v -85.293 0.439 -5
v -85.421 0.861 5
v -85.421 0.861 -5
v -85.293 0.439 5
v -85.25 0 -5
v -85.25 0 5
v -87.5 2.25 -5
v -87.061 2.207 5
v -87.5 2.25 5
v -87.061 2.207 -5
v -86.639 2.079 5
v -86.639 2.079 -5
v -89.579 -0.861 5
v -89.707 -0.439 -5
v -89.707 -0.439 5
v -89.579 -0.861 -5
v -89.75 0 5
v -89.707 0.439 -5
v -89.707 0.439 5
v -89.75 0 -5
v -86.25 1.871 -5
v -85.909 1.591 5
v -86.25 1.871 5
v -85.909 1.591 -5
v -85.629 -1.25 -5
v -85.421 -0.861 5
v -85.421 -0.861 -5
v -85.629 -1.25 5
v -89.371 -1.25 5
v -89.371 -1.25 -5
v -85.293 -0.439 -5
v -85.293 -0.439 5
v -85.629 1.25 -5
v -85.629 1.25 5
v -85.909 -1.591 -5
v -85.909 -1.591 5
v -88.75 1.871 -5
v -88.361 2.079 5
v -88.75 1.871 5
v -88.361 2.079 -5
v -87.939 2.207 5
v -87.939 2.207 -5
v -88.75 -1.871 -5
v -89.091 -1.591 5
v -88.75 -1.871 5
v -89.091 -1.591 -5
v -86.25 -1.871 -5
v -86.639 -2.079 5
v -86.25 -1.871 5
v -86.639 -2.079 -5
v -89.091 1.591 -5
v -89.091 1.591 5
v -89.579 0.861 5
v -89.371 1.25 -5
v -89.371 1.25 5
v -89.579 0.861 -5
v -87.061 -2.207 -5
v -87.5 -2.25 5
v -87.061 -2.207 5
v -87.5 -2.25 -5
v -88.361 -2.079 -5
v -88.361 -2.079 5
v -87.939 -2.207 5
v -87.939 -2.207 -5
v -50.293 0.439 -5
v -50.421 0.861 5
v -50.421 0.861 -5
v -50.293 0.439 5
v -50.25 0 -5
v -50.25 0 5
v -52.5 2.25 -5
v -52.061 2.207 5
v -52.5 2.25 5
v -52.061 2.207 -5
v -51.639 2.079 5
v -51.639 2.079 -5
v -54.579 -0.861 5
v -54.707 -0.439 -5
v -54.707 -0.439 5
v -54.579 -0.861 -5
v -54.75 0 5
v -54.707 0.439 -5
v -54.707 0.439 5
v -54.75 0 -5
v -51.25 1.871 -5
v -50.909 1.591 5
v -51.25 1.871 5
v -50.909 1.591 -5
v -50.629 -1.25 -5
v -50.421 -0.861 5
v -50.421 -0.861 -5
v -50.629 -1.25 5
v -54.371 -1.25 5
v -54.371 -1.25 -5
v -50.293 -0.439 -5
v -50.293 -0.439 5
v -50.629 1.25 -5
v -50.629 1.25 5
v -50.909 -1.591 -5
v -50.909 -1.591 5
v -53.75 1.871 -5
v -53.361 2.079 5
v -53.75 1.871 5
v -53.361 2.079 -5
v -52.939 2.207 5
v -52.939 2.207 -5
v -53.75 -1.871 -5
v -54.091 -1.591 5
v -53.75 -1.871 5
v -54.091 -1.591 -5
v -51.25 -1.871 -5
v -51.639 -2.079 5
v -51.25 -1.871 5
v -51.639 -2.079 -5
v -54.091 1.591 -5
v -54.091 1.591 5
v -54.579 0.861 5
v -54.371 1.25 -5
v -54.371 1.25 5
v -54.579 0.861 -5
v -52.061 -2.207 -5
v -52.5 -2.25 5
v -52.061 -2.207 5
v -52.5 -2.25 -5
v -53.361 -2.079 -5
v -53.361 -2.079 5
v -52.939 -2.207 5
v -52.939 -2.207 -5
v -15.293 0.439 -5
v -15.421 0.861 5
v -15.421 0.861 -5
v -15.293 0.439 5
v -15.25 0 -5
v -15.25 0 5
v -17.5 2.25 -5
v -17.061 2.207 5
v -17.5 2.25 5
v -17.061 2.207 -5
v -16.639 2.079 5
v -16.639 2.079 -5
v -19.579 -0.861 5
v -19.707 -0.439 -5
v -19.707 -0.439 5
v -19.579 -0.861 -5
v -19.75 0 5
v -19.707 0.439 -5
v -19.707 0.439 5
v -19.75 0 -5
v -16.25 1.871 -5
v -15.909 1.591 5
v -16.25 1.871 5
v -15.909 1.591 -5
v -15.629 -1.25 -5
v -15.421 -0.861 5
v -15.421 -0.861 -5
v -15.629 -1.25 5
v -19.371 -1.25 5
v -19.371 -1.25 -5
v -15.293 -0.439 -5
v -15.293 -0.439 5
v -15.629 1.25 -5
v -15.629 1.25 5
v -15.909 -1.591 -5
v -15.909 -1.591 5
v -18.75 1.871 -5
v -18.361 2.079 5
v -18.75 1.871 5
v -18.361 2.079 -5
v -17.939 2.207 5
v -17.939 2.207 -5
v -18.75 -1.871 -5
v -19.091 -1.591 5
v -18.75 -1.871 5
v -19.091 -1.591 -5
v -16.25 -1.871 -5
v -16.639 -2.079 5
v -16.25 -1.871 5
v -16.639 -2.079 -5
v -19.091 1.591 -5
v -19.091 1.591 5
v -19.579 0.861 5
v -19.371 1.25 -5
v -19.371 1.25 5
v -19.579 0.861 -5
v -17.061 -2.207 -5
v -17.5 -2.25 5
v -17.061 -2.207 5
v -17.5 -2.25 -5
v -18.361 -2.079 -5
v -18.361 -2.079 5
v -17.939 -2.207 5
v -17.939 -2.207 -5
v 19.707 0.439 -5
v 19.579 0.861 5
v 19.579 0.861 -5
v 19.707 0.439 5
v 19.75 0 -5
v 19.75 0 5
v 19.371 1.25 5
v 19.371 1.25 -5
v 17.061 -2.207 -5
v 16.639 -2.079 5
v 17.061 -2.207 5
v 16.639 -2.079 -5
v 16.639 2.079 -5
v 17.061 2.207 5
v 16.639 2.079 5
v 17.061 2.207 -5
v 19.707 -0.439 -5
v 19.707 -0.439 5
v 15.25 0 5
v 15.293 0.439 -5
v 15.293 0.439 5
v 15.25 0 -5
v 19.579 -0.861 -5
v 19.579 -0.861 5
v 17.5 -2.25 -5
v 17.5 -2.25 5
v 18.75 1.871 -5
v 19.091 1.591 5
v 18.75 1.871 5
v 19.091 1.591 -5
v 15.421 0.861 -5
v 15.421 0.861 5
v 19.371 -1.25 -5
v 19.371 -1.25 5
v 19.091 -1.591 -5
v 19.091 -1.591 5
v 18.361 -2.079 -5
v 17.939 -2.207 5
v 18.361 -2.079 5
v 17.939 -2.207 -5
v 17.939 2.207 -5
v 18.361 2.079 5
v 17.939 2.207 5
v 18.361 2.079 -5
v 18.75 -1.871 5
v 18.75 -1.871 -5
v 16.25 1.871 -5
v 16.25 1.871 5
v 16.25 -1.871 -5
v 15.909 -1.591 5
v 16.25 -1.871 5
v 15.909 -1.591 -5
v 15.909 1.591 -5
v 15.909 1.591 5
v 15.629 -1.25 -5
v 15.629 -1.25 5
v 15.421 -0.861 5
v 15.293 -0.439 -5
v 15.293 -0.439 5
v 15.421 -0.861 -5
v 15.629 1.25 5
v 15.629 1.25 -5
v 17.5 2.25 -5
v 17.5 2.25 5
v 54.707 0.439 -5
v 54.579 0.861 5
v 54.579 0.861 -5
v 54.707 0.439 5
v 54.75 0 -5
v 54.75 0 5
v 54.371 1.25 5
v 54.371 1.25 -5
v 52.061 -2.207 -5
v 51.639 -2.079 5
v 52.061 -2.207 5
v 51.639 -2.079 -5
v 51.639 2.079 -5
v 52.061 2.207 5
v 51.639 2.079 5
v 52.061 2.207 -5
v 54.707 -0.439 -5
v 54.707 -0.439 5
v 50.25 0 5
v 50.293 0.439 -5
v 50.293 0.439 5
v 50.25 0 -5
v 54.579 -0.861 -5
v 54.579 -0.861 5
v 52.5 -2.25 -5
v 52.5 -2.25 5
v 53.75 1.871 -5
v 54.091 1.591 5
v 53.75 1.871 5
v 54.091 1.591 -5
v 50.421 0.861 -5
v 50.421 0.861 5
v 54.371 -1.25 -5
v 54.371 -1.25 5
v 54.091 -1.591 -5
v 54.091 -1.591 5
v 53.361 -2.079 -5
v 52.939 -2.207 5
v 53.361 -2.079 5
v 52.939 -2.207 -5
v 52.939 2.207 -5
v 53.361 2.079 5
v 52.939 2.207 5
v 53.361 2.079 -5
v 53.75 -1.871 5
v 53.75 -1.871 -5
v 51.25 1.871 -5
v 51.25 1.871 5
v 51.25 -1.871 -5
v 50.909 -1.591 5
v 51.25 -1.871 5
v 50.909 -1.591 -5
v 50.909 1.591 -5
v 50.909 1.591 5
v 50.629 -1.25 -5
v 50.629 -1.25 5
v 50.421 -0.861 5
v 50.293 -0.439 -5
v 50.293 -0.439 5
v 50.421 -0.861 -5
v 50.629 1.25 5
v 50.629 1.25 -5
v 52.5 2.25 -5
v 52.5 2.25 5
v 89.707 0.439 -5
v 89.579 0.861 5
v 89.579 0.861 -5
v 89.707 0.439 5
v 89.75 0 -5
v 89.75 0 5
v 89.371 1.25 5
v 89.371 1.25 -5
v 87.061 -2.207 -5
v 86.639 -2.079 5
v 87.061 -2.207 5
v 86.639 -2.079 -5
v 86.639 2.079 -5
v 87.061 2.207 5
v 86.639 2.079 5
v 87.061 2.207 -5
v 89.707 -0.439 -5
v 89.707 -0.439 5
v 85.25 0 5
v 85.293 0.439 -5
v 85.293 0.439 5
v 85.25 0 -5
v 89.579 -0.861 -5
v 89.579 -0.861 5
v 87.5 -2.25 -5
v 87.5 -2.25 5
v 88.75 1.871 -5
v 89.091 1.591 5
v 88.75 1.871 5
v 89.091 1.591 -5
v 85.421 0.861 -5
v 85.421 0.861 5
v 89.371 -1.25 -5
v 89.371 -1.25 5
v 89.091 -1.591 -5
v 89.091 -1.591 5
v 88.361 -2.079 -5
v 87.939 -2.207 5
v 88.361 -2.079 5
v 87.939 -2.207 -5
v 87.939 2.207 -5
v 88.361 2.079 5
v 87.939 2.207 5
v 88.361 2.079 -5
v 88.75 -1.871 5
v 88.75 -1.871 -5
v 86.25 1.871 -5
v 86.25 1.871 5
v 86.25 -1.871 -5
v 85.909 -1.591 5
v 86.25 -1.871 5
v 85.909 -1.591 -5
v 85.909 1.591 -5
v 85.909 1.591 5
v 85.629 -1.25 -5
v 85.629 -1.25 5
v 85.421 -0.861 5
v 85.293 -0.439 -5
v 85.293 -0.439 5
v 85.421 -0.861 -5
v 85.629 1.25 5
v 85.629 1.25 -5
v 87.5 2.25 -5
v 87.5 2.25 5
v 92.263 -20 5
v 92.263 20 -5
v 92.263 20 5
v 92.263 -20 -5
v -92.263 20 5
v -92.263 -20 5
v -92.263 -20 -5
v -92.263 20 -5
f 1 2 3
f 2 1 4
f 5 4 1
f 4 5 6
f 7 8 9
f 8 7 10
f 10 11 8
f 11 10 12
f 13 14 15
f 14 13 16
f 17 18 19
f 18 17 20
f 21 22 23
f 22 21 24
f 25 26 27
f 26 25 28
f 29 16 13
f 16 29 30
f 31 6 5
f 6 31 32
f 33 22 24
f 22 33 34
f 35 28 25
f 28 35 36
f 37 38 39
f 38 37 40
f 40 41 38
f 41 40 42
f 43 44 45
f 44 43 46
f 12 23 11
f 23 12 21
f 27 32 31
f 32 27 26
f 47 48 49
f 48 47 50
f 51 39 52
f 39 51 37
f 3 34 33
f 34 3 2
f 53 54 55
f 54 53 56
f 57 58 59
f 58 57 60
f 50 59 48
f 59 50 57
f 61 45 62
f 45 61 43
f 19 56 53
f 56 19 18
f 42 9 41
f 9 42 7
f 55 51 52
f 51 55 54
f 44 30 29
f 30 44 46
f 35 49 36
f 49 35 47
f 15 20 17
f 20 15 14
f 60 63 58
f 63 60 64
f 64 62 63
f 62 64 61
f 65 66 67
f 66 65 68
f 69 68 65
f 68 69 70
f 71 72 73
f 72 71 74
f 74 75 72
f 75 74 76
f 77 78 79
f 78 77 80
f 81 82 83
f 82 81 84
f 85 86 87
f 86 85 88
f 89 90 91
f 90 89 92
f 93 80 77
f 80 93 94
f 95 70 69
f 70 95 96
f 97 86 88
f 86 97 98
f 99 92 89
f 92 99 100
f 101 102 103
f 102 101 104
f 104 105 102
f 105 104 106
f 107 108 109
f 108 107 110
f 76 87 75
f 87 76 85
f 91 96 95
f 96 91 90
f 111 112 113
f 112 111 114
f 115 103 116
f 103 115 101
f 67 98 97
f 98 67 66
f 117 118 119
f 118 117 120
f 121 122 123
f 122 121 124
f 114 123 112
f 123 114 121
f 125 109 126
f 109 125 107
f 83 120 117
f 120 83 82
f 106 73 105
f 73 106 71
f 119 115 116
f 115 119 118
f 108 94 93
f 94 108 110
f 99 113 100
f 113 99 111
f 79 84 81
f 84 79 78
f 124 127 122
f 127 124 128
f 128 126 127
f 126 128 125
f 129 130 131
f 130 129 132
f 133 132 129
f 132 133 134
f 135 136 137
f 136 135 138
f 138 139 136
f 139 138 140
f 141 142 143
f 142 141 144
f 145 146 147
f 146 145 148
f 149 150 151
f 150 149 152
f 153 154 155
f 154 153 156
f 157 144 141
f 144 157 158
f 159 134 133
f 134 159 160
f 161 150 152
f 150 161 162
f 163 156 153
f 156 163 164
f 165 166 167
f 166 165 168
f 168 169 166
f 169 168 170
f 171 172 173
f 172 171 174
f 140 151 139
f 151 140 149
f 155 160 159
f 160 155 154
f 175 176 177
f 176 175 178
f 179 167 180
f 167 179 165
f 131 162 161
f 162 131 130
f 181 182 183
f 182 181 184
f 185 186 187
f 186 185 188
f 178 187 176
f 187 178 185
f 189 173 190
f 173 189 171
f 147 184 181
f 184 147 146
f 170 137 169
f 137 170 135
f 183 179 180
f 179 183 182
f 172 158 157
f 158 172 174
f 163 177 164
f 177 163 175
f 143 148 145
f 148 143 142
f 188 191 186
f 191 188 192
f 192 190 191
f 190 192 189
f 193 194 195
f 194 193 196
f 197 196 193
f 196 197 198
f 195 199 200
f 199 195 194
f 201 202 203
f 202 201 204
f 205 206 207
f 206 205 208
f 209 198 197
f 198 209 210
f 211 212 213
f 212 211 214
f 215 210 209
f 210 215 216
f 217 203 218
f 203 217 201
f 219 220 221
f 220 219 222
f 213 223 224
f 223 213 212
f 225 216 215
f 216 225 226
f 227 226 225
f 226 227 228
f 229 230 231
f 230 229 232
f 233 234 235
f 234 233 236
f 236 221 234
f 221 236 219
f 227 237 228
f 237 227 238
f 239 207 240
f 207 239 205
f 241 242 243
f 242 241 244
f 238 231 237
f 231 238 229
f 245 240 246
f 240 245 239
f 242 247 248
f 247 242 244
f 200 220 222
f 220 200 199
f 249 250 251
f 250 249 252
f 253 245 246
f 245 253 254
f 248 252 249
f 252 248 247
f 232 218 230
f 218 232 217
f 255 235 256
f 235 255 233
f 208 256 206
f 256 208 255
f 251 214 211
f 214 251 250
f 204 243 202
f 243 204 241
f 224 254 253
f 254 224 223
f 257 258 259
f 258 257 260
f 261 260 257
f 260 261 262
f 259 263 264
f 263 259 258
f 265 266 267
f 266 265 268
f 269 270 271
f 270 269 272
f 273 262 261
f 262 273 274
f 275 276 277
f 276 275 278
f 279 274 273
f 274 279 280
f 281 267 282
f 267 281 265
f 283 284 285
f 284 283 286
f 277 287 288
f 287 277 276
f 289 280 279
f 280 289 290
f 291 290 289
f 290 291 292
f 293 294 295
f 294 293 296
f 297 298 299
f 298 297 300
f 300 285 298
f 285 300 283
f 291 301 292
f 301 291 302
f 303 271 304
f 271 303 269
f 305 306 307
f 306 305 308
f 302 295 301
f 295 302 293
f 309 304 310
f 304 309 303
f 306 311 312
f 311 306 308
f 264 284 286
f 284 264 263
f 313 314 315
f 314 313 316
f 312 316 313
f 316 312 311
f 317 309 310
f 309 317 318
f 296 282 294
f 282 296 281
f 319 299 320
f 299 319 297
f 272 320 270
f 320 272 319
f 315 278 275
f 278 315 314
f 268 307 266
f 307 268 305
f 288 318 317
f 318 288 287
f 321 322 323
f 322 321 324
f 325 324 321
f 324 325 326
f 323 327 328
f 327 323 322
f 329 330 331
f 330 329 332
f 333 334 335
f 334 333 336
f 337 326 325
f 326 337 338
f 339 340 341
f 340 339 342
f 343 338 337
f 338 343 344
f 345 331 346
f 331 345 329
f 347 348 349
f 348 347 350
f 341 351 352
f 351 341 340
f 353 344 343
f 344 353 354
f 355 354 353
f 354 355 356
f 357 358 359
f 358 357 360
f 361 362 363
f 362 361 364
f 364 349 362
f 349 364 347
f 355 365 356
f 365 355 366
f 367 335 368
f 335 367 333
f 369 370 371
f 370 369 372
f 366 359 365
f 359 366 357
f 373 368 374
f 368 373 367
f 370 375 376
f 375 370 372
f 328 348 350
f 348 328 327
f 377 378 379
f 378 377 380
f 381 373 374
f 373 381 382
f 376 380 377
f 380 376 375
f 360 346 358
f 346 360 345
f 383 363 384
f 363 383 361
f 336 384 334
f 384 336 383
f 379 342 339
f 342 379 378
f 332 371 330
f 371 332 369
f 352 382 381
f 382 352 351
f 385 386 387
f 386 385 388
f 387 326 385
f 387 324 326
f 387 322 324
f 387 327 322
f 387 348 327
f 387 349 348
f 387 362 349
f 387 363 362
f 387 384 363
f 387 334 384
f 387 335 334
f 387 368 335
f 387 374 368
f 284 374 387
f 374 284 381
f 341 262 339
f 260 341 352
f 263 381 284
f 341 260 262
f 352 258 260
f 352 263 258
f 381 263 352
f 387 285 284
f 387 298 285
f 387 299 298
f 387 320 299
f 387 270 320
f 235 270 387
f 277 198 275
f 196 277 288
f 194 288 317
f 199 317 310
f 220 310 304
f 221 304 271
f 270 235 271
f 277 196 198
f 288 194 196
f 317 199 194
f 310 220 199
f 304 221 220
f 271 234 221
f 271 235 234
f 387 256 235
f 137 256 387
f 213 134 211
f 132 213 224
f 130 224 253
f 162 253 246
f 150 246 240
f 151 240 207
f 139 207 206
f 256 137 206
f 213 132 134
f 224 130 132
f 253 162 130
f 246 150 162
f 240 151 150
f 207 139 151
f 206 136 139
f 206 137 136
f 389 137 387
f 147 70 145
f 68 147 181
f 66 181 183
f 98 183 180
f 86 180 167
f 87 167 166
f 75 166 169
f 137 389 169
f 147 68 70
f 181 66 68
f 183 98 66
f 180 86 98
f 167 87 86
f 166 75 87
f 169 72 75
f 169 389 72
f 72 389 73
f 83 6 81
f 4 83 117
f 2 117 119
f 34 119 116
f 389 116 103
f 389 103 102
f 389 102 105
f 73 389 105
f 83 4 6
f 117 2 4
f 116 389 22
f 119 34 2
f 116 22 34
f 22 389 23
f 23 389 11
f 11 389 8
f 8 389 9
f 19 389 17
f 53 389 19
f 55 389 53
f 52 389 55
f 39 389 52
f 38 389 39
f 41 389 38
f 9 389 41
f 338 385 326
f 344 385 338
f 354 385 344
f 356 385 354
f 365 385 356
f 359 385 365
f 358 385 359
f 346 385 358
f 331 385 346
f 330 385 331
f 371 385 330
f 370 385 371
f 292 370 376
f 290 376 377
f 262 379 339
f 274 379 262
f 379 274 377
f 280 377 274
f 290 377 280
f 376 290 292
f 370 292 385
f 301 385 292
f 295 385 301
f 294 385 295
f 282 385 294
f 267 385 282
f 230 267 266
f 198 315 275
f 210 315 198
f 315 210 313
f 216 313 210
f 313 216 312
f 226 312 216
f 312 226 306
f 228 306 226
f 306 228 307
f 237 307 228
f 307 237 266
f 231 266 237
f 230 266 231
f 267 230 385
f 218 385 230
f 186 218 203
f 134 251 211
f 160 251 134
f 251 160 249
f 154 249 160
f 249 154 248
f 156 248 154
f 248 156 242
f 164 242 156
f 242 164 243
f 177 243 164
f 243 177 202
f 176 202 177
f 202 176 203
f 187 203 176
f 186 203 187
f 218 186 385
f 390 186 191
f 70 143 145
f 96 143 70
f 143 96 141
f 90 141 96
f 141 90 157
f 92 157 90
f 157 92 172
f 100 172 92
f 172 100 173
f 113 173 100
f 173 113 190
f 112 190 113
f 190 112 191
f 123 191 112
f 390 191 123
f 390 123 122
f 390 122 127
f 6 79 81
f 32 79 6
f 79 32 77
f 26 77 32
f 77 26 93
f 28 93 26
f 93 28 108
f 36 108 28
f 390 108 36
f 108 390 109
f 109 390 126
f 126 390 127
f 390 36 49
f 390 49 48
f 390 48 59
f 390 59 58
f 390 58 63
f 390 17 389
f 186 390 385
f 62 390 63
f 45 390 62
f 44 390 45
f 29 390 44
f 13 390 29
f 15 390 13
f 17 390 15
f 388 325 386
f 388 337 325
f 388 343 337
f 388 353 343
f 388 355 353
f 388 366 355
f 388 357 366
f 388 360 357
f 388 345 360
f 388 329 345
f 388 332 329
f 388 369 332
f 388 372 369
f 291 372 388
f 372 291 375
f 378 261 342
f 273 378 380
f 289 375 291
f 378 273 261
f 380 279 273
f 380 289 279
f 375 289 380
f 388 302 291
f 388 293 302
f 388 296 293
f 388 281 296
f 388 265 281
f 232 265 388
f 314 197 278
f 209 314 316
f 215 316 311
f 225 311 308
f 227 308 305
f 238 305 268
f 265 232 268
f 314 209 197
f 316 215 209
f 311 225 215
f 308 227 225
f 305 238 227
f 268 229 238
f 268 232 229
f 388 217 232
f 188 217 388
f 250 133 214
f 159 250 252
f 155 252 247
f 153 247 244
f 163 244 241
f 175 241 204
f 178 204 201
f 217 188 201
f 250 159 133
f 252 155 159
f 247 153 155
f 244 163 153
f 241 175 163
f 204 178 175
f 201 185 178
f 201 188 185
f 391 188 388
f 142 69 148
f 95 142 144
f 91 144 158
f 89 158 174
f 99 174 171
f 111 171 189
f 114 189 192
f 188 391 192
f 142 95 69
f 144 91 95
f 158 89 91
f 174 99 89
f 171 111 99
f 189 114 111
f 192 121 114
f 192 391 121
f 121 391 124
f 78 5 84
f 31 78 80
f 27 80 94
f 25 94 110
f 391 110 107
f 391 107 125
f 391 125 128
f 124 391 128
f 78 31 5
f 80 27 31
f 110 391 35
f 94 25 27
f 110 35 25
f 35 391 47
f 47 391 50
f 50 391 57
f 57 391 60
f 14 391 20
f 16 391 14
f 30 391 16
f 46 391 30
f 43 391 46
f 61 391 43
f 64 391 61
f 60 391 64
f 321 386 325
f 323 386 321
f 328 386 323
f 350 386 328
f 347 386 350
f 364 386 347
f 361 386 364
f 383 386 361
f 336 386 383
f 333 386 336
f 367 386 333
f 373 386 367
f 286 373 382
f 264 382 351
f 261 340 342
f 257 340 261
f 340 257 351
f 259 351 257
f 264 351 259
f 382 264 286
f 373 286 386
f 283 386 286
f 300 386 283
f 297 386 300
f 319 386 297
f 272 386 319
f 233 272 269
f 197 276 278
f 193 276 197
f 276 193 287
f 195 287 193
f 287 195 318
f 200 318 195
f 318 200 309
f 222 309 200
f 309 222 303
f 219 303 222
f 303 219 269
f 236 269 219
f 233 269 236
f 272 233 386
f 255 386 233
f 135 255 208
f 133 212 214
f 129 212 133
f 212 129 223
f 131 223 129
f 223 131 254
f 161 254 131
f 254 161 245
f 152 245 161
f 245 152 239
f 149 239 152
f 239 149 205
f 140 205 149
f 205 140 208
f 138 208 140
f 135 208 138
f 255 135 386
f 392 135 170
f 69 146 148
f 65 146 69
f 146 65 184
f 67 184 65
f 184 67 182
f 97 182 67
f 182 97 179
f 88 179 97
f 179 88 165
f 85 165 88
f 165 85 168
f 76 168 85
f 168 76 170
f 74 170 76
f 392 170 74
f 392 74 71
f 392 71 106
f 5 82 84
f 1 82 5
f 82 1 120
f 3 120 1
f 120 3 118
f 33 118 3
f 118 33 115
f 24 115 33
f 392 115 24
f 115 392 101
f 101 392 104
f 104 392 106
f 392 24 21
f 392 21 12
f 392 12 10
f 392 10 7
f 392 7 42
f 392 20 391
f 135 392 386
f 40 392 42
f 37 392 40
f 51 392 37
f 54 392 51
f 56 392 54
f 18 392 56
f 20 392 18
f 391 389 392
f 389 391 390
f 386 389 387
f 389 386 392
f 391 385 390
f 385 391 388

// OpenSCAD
$fn = 32;

// ----------------------------------------------------------------------
// Hole bar, 6 x Ø4.5
// skip layout, 4.7625 mm edge offset
// ----------------------------------------------------------------------

// --- parameters (mm) ---
bar_w = 40;         // bar width (Y)
bar_t = 10;         // bar thickness (Z)
holes = 6;          // holes per row
hole_d = 4.5;       // hole diameter
edge = 4.763;       // offset from the bar end to the first hole
grid_pitch = 17.5;  // grid the bar was laid out on

// --- derived feature positions (mm) ---
pitch = grid_pitch * 2;       // = 35   holes sit every other grid slot
span = (holes - 1) * pitch;   // = 175   distance between the end holes
bar_l = span + 2 * edge;      // = 184.53   overall bar length
start_x = -bar_l / 2 + edge;  // = -87.5   X of the first hole
feature_centers = [
  [start_x + 0 * pitch, 0],
  [start_x + 1 * pitch, 0],
  [start_x + 2 * pitch, 0],
  [start_x + 3 * pitch, 0],
  [start_x + 4 * pitch, 0],
  [start_x + 5 * pitch, 0]
];   // hole centres of the first row

// bar with one row of holes, drilled from feature_centers
difference() {
  translate([-bar_l / 2, -bar_w / 2, -bar_t / 2]) cube([bar_l, bar_w, bar_t]);
  for (centre = feature_centers)
    translate([centre[0], centre[1], 0])
      cylinder(d = hole_d, h = bar_t + 2, center = true);
}
